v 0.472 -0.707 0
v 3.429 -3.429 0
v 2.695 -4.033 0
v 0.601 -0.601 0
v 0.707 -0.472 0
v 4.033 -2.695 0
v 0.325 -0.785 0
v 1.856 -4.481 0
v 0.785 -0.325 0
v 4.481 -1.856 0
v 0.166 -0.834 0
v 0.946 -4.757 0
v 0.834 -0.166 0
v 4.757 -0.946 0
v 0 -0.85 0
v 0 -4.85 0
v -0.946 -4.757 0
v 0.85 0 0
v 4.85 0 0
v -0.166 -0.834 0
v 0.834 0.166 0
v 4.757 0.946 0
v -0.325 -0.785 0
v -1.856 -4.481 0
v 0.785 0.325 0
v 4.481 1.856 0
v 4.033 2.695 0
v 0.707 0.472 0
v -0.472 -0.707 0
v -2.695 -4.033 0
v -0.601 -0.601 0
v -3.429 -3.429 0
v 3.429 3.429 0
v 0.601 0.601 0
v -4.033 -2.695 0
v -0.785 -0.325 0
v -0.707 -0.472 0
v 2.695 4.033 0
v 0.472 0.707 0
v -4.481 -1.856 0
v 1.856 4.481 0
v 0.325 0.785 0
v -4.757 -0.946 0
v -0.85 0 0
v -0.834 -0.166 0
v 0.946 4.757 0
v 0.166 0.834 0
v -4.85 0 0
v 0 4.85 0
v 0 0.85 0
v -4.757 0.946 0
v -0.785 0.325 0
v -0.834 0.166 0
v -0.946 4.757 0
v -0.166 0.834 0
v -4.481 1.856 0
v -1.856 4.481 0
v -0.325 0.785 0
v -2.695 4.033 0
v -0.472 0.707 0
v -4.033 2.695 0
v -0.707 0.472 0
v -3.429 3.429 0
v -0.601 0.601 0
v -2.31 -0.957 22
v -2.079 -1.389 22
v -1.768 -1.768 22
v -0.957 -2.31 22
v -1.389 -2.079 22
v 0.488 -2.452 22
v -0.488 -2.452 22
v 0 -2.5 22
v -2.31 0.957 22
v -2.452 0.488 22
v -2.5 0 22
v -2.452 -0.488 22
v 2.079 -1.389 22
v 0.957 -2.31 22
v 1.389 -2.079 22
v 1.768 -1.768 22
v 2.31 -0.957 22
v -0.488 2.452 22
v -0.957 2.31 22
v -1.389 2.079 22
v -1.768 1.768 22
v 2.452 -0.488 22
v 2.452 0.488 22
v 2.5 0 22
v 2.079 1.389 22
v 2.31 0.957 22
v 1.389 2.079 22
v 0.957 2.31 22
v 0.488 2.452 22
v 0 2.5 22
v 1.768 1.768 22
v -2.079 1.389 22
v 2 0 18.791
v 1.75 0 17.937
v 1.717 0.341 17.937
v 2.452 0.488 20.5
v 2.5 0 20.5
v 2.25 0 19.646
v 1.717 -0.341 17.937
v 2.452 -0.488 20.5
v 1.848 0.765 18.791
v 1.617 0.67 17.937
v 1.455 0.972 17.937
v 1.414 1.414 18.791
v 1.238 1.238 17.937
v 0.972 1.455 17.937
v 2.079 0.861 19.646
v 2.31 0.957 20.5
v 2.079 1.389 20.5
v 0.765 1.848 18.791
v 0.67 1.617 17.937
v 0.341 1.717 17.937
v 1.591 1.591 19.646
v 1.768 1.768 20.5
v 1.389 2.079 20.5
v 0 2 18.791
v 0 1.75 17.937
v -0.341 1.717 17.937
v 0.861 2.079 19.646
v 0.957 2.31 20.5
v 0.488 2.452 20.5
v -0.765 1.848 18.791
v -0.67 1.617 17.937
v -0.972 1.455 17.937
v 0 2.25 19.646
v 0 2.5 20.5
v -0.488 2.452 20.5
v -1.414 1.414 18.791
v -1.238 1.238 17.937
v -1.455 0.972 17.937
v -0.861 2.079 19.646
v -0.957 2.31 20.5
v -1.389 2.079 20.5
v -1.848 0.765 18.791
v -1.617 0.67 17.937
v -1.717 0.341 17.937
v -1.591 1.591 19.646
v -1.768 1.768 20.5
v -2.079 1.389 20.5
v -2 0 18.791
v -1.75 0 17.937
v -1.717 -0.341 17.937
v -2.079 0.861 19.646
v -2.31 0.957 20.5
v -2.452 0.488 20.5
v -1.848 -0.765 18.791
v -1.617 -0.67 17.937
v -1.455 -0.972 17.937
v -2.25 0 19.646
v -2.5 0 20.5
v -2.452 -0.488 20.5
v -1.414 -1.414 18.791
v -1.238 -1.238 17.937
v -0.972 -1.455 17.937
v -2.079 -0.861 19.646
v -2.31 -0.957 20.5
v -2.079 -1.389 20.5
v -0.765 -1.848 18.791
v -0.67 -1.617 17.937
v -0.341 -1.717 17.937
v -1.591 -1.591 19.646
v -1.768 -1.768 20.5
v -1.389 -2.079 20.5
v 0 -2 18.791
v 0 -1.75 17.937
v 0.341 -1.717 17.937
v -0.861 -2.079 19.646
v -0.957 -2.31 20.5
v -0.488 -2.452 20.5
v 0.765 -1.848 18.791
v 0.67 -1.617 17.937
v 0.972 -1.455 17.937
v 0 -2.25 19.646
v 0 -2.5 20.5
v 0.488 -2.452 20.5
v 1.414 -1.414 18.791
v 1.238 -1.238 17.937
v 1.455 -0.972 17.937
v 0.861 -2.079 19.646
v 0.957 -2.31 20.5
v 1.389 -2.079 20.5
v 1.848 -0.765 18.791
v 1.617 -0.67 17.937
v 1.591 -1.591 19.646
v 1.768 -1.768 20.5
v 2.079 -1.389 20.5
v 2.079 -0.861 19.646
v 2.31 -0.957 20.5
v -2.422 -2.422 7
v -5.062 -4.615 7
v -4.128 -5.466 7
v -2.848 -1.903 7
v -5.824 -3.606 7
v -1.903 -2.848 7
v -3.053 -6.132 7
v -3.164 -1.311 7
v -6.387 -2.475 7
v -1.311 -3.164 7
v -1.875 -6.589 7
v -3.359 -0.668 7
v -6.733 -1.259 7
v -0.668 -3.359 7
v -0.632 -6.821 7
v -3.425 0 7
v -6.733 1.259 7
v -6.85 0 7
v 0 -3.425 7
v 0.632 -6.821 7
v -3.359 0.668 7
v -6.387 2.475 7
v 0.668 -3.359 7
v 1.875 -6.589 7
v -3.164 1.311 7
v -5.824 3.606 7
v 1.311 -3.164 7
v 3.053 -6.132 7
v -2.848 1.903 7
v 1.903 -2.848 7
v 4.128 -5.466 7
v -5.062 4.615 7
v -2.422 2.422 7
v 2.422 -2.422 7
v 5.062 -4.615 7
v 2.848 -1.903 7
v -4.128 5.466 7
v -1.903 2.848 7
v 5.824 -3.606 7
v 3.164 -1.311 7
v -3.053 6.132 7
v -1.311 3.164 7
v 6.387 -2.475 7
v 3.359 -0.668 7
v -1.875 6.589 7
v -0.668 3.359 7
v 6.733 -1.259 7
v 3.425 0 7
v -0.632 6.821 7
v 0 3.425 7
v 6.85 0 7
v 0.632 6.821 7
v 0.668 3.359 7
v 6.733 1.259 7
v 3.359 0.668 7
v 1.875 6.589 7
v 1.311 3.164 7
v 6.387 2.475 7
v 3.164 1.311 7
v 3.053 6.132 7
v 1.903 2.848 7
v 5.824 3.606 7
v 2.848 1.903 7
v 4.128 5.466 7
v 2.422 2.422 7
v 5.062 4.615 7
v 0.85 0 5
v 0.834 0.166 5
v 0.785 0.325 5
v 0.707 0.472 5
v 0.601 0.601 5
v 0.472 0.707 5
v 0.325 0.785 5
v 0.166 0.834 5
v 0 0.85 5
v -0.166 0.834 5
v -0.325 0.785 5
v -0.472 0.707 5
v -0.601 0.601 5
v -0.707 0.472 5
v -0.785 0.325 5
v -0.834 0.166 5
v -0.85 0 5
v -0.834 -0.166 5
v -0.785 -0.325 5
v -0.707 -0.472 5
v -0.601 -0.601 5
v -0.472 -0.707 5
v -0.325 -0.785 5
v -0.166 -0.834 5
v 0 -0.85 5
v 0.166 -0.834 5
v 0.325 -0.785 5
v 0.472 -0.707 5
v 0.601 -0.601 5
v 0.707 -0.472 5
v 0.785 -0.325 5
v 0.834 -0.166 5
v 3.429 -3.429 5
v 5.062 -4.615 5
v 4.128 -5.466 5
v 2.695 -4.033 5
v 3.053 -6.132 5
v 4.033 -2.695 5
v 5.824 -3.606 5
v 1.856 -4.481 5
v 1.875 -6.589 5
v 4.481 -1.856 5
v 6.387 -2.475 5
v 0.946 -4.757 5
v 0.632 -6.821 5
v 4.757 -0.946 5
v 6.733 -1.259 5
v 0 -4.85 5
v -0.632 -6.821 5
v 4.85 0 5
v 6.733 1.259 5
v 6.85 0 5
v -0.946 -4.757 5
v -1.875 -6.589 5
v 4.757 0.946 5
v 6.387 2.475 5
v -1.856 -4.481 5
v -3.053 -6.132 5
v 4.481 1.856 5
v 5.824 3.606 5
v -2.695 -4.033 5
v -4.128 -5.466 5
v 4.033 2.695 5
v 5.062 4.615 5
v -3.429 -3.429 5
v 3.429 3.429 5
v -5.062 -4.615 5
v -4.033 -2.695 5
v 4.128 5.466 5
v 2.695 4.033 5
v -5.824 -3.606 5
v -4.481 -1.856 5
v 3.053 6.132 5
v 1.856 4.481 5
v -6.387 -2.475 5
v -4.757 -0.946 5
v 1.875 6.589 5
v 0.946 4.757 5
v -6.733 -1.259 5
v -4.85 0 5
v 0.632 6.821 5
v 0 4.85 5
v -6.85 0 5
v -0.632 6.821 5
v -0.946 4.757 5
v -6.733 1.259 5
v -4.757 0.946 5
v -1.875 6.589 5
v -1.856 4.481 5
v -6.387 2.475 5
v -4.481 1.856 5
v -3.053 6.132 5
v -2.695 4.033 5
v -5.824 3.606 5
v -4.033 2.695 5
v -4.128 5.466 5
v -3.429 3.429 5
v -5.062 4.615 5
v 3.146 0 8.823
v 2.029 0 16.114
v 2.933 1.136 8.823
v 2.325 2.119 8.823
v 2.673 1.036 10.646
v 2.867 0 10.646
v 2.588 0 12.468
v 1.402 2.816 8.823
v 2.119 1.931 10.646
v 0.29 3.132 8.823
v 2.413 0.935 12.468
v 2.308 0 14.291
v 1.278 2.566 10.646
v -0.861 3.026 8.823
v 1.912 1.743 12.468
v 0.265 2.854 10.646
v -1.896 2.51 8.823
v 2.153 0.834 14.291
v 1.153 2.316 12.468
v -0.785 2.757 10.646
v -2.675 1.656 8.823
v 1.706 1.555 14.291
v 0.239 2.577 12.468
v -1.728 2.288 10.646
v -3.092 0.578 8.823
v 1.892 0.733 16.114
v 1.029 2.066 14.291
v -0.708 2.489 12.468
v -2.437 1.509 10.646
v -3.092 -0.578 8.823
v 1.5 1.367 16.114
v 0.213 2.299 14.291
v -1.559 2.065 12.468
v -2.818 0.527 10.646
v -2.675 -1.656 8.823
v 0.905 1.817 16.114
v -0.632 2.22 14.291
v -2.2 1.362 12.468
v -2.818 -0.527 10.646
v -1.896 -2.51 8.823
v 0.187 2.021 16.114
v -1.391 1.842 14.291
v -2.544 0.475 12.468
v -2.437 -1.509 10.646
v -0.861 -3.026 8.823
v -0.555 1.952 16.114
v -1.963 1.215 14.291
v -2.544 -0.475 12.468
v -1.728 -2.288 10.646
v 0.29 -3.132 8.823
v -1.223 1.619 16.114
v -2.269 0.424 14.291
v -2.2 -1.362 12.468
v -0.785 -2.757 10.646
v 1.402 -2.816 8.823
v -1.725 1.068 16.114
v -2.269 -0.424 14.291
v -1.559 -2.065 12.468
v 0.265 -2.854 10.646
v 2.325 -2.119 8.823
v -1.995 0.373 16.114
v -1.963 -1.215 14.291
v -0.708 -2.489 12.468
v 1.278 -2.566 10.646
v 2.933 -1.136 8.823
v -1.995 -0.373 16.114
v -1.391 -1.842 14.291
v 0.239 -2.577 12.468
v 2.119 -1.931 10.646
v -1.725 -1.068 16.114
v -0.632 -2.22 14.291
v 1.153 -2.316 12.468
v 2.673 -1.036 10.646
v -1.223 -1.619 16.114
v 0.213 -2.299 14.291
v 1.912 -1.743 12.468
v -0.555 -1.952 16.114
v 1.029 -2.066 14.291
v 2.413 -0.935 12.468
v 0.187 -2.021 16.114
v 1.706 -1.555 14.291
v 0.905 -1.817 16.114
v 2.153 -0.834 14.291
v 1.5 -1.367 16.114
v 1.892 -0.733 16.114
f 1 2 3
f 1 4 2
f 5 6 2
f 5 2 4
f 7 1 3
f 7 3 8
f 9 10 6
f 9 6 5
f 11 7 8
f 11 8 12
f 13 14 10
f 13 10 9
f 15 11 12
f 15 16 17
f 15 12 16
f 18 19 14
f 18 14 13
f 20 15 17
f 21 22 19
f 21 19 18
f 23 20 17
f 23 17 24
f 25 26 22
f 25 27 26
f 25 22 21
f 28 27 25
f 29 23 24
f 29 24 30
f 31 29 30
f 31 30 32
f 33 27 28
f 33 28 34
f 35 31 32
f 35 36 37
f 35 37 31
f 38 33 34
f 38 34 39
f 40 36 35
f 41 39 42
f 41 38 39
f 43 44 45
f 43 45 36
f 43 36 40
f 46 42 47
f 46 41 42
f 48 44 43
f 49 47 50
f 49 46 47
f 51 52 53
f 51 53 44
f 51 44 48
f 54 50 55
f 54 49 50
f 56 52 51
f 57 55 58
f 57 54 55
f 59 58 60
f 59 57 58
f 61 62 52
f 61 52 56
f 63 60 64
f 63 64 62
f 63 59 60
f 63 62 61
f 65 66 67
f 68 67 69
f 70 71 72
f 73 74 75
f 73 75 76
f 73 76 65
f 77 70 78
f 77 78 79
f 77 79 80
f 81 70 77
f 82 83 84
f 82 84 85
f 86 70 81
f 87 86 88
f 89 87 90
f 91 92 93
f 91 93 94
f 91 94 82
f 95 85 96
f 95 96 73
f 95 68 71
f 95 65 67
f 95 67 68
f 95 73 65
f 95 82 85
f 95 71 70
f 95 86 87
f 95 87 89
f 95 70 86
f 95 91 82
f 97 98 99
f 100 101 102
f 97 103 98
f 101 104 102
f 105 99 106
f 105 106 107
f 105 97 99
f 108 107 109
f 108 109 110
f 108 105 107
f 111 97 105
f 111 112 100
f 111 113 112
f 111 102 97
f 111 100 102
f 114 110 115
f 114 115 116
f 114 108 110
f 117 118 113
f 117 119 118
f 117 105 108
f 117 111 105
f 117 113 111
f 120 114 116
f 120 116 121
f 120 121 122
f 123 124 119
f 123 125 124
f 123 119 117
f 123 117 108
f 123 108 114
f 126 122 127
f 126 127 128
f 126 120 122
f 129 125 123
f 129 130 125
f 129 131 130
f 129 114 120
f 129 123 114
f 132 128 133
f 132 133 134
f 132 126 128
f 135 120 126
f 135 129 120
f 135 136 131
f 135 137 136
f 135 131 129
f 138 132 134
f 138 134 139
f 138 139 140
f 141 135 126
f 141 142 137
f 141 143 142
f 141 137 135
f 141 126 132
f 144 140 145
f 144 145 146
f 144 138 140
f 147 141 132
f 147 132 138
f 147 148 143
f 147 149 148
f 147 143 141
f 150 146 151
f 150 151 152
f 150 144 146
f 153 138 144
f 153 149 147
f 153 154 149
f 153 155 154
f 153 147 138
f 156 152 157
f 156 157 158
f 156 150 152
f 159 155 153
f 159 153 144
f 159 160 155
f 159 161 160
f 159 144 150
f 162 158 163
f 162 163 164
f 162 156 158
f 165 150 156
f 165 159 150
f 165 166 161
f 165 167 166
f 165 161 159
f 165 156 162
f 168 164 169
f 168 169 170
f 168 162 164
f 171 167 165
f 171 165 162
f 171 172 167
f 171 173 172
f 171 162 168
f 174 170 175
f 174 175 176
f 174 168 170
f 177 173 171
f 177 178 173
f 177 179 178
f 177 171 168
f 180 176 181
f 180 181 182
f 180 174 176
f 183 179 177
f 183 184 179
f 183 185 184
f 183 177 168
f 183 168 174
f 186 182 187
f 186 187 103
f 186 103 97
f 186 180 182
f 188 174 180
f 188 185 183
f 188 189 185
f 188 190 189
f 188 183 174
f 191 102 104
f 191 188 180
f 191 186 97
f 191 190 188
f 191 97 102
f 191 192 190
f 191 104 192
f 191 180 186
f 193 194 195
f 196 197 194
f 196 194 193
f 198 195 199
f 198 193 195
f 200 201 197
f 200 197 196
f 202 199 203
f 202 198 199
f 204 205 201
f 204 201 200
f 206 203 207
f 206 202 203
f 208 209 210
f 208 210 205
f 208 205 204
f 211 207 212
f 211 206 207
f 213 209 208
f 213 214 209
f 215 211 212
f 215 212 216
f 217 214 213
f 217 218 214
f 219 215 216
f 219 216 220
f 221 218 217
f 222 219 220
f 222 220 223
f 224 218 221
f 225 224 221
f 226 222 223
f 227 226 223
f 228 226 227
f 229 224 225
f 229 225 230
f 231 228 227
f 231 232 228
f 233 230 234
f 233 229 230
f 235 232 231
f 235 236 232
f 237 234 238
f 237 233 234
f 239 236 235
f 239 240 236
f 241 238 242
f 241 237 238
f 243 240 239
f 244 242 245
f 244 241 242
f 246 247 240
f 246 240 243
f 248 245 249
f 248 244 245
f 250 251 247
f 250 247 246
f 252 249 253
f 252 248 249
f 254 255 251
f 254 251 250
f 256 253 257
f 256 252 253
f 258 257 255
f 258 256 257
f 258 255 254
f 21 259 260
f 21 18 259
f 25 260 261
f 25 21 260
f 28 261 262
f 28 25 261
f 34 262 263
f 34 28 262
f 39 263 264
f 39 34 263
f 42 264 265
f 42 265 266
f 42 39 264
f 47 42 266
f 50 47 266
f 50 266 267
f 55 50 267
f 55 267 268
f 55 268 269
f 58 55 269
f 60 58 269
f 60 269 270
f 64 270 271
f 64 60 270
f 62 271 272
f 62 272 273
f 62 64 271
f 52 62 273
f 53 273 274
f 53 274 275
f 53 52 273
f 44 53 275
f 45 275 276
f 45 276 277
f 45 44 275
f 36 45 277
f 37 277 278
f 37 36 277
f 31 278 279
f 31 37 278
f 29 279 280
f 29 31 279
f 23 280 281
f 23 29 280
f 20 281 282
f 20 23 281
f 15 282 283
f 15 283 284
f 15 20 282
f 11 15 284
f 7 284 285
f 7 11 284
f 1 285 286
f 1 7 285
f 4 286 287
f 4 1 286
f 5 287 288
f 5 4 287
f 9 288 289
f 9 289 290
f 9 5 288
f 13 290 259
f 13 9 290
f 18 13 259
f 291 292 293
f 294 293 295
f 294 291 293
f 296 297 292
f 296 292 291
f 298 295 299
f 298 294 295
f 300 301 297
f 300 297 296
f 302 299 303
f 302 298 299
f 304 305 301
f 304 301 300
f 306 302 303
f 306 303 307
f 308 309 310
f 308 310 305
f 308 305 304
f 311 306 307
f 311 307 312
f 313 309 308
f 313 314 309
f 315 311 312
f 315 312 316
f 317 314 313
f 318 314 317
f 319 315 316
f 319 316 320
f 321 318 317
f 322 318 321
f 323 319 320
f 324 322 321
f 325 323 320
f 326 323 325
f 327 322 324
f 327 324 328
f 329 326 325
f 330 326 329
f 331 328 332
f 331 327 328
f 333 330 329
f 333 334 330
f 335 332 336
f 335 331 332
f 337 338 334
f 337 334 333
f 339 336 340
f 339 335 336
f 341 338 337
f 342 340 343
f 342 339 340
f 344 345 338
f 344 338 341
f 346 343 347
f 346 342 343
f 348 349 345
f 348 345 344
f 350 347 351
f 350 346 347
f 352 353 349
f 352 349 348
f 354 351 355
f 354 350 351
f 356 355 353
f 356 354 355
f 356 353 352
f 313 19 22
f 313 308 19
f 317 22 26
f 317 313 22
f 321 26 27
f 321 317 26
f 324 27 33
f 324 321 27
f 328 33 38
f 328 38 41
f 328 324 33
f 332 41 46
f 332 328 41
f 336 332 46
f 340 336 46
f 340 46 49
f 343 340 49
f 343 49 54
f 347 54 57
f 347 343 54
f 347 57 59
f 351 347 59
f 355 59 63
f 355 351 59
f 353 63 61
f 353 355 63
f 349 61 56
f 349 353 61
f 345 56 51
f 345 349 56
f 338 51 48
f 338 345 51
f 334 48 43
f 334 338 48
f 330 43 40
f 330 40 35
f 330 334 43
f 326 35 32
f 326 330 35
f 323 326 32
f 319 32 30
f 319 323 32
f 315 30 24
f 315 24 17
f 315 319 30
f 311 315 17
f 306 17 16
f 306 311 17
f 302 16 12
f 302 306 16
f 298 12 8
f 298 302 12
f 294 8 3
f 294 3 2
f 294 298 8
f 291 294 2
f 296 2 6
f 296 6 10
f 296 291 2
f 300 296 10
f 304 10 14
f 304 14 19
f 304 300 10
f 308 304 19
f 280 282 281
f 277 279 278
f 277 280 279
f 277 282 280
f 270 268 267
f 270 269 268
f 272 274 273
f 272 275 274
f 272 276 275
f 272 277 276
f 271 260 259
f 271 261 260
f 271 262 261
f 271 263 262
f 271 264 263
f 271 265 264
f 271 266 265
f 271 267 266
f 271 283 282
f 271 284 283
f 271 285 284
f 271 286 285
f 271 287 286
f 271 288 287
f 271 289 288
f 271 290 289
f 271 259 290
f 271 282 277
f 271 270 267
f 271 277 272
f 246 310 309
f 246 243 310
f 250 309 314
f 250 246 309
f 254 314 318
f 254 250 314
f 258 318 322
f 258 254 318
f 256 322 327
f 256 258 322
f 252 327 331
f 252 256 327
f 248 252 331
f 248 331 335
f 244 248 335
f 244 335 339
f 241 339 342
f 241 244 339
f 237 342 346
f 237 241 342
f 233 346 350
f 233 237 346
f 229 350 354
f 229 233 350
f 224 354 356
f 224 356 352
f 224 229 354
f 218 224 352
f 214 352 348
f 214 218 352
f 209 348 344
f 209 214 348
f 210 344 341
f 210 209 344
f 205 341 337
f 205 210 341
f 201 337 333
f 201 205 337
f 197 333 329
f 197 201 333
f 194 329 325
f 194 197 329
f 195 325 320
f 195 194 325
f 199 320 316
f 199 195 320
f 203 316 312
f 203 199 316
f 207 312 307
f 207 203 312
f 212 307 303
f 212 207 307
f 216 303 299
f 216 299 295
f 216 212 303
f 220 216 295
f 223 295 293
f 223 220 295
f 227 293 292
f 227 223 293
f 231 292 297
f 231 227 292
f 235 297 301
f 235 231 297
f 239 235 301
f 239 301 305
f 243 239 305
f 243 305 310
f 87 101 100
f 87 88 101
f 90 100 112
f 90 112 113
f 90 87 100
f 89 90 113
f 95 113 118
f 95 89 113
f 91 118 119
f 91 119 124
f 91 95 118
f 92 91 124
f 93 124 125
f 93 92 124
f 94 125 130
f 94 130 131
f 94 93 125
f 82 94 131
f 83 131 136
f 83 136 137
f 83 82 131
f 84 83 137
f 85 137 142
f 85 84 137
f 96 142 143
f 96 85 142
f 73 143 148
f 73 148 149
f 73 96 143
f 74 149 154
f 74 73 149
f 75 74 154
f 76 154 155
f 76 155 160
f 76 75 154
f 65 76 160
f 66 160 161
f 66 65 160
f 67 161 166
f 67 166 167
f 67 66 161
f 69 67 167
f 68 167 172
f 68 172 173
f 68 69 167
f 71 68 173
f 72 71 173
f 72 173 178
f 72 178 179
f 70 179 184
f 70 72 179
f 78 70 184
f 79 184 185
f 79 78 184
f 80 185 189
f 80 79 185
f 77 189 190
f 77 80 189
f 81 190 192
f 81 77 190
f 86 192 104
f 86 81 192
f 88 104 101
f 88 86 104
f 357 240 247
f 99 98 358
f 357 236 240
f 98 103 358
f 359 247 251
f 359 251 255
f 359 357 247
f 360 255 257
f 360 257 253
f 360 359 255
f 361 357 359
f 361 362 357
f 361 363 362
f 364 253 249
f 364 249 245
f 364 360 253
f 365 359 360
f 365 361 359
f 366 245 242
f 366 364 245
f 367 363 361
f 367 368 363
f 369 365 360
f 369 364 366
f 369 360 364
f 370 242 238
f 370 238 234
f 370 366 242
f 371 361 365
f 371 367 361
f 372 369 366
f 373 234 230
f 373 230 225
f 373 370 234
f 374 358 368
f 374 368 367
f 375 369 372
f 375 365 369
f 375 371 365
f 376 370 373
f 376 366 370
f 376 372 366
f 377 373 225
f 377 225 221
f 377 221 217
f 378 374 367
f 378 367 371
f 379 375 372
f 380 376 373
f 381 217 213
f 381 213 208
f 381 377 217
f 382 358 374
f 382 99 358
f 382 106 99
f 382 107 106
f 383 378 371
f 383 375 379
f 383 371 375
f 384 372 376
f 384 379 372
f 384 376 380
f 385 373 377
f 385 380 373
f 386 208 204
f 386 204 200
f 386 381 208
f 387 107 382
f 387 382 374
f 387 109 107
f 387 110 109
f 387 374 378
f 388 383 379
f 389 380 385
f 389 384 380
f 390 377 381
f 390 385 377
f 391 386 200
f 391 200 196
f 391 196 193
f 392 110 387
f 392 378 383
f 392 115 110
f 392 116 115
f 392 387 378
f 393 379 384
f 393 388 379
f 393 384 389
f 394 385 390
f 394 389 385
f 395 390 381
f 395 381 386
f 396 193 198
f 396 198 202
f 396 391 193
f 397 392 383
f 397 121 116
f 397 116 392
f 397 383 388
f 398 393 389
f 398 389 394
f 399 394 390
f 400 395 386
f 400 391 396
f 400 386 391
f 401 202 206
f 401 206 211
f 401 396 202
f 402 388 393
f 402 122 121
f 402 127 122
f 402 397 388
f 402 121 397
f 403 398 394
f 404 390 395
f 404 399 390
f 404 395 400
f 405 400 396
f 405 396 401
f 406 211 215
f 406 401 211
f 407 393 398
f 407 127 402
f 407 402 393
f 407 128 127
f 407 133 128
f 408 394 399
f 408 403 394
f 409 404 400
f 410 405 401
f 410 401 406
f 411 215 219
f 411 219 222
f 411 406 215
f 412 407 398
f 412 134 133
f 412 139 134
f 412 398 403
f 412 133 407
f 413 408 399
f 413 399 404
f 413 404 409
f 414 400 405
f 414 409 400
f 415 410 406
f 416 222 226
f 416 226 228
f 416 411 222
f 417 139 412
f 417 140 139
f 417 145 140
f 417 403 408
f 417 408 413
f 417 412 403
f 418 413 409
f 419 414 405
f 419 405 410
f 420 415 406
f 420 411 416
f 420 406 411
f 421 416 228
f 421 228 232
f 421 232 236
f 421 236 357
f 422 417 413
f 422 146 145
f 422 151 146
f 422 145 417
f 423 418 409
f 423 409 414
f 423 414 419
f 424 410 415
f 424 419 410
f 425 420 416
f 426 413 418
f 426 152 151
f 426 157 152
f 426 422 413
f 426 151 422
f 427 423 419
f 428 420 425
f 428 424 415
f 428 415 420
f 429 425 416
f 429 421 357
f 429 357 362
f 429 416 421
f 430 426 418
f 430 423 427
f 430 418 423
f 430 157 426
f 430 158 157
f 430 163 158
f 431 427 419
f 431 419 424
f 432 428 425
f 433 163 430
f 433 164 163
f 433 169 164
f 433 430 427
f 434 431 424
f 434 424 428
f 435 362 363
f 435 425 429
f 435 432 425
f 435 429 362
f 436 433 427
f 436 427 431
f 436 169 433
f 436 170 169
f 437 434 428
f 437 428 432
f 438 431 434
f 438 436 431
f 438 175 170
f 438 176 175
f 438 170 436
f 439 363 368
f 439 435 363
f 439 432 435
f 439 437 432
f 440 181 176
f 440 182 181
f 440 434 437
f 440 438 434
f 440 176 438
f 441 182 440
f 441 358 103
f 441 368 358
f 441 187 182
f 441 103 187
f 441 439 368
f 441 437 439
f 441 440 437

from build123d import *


with BuildPart() as f1:
    # F0 (on Front) → F1 (revolve)
    with BuildSketch(Plane.XZ):
        Polygon((0, 7), (0, 5), (0.85, 5), (0.85, 0), (4.85, 0), (4.85, 5), (6.85, 5), (6.85, 7), (3.425, 7), align=None)
        Polygon((0, 22), (0, 7), (3.425, 7), (1.750177, 17.936636), (2.5, 20.5), (2.5, 22), align=None)
    revolve(axis=Axis((0, 0, 15.337315), (0, 0, 1)))


solid = f1.part
